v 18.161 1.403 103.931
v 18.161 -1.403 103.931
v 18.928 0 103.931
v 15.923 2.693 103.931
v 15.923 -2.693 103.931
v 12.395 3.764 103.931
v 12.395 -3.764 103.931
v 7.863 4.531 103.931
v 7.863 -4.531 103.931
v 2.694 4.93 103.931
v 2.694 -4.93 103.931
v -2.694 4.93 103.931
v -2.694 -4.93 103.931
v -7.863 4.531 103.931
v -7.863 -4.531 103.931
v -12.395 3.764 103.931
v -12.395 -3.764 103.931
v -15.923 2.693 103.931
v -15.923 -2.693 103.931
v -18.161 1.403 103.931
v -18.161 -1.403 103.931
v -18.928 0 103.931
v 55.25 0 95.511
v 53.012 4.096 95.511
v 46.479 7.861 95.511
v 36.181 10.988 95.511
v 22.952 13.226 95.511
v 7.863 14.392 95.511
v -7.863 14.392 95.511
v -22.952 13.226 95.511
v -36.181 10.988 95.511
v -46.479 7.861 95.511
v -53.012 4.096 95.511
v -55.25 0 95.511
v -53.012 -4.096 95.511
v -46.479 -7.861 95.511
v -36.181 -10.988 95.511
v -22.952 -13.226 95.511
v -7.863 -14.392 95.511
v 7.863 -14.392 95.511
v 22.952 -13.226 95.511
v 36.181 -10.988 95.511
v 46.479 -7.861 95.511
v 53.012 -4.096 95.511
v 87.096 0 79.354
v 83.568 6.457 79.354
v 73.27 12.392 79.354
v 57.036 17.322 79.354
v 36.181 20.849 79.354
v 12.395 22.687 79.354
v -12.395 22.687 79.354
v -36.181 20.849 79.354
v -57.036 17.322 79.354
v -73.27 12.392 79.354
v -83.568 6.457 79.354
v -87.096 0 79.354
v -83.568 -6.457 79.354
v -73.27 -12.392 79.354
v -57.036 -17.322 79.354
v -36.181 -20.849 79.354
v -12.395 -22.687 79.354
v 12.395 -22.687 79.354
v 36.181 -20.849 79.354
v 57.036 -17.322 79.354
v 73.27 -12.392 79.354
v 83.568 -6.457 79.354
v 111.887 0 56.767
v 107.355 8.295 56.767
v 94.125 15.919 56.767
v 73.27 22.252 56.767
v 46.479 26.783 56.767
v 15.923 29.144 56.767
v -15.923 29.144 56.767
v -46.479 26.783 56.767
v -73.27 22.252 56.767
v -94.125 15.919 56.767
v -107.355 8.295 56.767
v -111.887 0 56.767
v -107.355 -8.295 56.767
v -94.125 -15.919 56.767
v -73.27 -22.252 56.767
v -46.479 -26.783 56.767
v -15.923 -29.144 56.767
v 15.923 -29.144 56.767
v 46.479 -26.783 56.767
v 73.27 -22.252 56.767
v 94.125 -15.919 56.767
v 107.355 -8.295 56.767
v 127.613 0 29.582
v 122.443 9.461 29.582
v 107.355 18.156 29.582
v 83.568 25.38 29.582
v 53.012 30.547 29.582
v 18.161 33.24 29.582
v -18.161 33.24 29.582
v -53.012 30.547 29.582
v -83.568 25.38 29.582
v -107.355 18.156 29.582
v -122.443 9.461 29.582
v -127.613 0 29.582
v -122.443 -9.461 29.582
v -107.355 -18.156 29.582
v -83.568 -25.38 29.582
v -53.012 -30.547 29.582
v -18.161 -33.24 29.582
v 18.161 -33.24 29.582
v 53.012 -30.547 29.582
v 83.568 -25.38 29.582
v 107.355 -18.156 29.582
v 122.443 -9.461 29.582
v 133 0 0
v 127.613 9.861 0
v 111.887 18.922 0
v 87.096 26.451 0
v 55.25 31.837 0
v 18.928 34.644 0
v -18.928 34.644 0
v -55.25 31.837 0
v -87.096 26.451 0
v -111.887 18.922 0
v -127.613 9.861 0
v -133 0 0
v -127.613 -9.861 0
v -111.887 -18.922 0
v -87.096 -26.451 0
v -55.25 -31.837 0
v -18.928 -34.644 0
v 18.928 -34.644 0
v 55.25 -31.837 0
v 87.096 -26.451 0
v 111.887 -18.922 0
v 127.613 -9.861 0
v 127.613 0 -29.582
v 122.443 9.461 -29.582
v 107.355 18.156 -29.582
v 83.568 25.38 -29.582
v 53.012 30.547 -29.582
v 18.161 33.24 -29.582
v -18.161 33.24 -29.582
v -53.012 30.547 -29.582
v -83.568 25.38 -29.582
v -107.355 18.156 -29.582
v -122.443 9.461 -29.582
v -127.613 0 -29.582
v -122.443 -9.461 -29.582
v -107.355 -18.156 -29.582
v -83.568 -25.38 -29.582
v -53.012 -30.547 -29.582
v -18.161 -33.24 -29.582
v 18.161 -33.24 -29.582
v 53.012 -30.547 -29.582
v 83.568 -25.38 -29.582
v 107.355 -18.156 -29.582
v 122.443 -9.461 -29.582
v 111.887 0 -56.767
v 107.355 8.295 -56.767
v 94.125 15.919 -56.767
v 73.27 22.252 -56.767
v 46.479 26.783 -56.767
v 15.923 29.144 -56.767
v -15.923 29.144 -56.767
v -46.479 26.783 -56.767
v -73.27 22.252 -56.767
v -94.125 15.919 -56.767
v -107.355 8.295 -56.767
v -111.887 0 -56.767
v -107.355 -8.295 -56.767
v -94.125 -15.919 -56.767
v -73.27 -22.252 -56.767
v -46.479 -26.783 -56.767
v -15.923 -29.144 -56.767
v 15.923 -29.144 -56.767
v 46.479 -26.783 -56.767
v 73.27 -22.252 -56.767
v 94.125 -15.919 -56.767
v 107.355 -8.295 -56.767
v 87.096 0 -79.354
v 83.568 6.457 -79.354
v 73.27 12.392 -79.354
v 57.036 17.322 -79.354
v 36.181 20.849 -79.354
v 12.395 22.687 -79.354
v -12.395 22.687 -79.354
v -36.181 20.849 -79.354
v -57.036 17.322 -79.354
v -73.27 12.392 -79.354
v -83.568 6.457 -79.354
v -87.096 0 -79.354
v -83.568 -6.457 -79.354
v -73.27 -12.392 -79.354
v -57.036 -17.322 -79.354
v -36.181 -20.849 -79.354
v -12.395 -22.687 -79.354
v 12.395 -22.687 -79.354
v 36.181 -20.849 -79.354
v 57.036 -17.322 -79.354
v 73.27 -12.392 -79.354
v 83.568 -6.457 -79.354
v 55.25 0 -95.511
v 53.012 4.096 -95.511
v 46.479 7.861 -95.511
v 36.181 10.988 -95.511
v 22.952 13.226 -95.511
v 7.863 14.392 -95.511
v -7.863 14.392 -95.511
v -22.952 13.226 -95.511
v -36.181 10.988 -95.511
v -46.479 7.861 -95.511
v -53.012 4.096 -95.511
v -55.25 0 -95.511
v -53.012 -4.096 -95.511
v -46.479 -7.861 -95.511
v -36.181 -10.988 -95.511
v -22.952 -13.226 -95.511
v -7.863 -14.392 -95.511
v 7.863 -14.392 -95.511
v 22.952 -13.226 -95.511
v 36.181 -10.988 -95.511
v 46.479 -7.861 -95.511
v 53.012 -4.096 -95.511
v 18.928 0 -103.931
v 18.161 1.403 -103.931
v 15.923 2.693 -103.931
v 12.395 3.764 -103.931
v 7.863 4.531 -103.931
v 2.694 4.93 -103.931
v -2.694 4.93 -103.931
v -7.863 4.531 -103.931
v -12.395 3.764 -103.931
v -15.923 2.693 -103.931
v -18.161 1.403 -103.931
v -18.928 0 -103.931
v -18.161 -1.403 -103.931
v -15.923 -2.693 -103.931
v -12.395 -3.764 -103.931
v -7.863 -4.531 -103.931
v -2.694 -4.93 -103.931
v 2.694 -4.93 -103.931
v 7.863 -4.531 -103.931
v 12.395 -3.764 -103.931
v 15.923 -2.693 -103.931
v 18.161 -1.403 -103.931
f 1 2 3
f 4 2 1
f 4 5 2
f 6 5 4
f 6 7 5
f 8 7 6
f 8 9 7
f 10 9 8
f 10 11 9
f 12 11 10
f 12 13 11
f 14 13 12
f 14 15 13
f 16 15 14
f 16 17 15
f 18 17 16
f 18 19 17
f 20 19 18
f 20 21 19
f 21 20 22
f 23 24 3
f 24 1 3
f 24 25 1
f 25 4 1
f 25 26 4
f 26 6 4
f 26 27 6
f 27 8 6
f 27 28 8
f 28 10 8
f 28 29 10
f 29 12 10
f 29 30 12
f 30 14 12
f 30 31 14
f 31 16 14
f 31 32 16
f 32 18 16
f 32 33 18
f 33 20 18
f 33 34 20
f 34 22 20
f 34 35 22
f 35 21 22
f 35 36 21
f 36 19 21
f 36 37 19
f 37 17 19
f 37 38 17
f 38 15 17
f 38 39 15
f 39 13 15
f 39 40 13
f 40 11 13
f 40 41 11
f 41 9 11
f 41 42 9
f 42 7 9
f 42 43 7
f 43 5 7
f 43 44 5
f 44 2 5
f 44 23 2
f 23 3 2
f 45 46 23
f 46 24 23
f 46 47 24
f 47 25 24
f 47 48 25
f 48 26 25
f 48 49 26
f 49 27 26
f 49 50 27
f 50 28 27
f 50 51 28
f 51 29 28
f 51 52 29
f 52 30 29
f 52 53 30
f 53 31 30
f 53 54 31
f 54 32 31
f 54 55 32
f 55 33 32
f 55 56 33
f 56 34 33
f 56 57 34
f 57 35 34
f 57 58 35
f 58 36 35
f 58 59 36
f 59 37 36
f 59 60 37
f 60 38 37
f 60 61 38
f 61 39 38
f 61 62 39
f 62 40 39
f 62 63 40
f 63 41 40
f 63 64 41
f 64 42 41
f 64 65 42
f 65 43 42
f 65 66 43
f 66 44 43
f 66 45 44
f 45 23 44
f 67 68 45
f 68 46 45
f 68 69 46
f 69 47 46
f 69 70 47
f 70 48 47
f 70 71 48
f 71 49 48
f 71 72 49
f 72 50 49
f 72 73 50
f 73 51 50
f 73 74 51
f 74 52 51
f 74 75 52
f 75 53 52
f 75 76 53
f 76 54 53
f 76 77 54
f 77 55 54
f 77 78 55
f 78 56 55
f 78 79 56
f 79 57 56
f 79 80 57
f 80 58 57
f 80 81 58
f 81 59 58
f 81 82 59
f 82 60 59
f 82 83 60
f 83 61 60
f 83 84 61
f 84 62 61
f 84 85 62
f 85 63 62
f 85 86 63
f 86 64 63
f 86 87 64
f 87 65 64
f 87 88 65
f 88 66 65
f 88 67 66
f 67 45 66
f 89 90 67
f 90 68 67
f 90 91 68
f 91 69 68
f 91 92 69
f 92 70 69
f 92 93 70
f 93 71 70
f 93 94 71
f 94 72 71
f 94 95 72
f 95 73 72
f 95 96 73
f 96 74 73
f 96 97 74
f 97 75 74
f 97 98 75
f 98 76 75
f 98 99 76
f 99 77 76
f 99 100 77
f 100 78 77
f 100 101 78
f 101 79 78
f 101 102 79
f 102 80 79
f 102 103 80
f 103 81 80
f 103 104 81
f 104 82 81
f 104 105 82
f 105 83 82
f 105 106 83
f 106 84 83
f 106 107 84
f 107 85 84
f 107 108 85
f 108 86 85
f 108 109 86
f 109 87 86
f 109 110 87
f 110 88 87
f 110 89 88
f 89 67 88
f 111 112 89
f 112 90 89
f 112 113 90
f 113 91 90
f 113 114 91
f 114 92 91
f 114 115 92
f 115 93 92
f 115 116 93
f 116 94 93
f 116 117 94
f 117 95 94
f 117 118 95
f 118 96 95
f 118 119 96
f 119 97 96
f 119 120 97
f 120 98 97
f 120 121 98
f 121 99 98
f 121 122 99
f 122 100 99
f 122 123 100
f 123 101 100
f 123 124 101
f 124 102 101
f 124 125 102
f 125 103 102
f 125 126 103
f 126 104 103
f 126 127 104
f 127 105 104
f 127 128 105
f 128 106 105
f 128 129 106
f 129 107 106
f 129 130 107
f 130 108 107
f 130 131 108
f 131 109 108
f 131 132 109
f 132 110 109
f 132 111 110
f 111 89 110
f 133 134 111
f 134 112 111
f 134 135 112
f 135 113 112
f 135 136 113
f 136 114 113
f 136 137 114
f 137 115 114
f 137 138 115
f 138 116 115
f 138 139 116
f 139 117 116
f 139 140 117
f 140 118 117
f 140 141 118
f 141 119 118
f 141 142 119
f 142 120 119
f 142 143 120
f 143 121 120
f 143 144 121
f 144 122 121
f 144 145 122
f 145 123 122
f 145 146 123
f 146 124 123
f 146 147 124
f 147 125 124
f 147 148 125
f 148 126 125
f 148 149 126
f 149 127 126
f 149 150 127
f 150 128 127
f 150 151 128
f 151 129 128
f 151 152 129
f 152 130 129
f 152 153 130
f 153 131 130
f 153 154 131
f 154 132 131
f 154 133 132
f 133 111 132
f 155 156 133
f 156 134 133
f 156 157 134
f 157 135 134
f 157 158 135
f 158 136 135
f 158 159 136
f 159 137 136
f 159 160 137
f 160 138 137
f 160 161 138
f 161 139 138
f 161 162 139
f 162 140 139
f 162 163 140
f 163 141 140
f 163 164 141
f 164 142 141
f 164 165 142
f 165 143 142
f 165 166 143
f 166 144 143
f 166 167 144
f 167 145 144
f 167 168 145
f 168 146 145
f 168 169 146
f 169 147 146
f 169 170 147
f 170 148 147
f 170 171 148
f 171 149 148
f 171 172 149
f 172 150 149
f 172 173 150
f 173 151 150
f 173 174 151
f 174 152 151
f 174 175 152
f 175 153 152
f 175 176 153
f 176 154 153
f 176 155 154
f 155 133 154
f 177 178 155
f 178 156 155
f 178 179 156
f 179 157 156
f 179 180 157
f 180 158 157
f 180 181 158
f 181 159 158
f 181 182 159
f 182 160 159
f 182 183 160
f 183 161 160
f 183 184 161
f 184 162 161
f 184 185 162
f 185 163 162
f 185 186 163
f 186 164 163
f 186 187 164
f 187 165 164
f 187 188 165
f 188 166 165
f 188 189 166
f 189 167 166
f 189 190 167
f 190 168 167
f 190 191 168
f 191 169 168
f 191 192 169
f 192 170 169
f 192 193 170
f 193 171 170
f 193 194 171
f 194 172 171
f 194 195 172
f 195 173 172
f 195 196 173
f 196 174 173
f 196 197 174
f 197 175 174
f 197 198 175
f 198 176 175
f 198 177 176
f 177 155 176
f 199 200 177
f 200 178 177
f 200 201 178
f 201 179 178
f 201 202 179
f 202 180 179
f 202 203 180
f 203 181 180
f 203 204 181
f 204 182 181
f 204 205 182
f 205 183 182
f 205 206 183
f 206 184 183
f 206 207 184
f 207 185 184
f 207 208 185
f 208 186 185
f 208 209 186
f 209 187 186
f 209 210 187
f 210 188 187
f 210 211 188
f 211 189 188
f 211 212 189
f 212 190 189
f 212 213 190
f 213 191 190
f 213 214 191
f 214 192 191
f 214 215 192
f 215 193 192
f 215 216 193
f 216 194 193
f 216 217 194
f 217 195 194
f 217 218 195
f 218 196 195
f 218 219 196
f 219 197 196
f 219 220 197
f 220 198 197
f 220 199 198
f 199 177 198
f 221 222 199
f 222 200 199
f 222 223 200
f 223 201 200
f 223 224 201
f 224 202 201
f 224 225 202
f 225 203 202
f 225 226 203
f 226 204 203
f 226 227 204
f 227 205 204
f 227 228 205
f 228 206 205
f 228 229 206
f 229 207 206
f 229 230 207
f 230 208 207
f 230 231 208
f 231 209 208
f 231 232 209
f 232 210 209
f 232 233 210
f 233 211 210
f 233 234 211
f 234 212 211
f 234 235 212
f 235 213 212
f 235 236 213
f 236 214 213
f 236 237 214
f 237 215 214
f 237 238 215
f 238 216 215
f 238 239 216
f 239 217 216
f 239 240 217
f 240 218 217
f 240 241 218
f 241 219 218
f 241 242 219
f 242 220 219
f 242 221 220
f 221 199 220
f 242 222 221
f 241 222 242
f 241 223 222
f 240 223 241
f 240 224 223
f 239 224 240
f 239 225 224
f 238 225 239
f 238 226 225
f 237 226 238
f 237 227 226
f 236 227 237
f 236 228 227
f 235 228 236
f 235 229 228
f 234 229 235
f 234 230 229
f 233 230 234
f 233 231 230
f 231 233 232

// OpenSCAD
// Generated by SolidPython 1.0.1 on 2020-07-29 00:46:53


scale(v = [19, 5, 15]) {
	sphere(r = 7);
}
/***********************************************
*********      SolidPython code:      **********
************************************************
 
# import packages: SolidPython
from solid import *
from solid.utils import *
from itertools import chain, combinations, permutations


class Resize:

    def __init__(self, scad_file):
        self.scad_file = scad_file
        #self.scad_file = import_scad(scad_file)
        # cone/cylinder param:
        self.r1 = 0
        self.r2 = 0
        self.h = 0
        # rectangular prism param:
        self.w = 0
        self.l = 0
        # ellipse param:
        self.r = 0

    # import OpenScad code (file name corresponds to shape)


    # classify shape + parameters
    def assign(self, param1, param2, param3):
        if self.scad_file == 'cone.scad':
            self.r1 = param1
            self.r2 = param2
            self.h = param3
        elif self.scad_file == 'cylinder.scad':
            self.r1 = param1
            self.r2 = param2
            self.h = param3
        elif self.scad_file == 'rectangularPrism.scad':
            self.h = param1
            self.l = param2
            self.w = param3
        else:
            self.r = param1
            self.h = param2

    # resize parameters
    def iterate(self):
        x = range(3, 20, 2)
        i = 1
        if self.scad_file == 'cone.scad':
            tempList = list(permutations(x, 2))
            for temp in tempList:
                param1 = temp[0]
                param2 = temp[1]
                filepath = 'produced_scad_files/' + 'cone' + str(param1) + '_' + str(param2) + '_' + '.scad'
                scad_render_to_file(cylinder(h=param1, r1=param2, r2=0), filepath)

        elif self.scad_file == 'cylinder.scad':
            tempList = list(permutations(x, 3))
            for temp in tempList:
                param1 = temp[0]
                param2 = temp[1]
                filepath = 'produced_scad_files/' + 'cylinder' + str(param1) + '_' + str(param2) + '_' + '.scad'
                scad_render_to_file(cylinder(h=param1, r1=param2, r2=param2), filepath)

        elif self.scad_file == 'rectangularPrism.scad':
            tempList = list(permutations(x, 3))
            for temp in tempList:
                param1 = temp[0]
                param2 = temp[1]
                param3 = temp[2]
                filepath = 'produced_scad_files/' + 'rectangularPrism' + str(param1) + '_' + str(param2) + '_' + str(
                    param3) + '.scad'
                scad_render_to_file(cube(size=(param1, param2, param3)), filepath)

        elif self.scad_file == 'ellipse.scad':
            tempList = list(permutations(x, 4))
            for temp in tempList:
                param1 = temp[0]
                param2 = temp[1]
                param3 = temp[2]
                param4 = temp[3]
                filepath = 'produced_scad_files/' + 'ellipse' + str(param1) + '_' + str(param2) + '_' + str(param3) + '_' + str(param4) + '.scad'
                scad_render_to_file(scale([param1, param2, param3])(sphere(r=param4)), filepath)

    def render_to_scadfile(self):
        scad_render_to_file(scad, 'example.scad') 
 
************************************************/
